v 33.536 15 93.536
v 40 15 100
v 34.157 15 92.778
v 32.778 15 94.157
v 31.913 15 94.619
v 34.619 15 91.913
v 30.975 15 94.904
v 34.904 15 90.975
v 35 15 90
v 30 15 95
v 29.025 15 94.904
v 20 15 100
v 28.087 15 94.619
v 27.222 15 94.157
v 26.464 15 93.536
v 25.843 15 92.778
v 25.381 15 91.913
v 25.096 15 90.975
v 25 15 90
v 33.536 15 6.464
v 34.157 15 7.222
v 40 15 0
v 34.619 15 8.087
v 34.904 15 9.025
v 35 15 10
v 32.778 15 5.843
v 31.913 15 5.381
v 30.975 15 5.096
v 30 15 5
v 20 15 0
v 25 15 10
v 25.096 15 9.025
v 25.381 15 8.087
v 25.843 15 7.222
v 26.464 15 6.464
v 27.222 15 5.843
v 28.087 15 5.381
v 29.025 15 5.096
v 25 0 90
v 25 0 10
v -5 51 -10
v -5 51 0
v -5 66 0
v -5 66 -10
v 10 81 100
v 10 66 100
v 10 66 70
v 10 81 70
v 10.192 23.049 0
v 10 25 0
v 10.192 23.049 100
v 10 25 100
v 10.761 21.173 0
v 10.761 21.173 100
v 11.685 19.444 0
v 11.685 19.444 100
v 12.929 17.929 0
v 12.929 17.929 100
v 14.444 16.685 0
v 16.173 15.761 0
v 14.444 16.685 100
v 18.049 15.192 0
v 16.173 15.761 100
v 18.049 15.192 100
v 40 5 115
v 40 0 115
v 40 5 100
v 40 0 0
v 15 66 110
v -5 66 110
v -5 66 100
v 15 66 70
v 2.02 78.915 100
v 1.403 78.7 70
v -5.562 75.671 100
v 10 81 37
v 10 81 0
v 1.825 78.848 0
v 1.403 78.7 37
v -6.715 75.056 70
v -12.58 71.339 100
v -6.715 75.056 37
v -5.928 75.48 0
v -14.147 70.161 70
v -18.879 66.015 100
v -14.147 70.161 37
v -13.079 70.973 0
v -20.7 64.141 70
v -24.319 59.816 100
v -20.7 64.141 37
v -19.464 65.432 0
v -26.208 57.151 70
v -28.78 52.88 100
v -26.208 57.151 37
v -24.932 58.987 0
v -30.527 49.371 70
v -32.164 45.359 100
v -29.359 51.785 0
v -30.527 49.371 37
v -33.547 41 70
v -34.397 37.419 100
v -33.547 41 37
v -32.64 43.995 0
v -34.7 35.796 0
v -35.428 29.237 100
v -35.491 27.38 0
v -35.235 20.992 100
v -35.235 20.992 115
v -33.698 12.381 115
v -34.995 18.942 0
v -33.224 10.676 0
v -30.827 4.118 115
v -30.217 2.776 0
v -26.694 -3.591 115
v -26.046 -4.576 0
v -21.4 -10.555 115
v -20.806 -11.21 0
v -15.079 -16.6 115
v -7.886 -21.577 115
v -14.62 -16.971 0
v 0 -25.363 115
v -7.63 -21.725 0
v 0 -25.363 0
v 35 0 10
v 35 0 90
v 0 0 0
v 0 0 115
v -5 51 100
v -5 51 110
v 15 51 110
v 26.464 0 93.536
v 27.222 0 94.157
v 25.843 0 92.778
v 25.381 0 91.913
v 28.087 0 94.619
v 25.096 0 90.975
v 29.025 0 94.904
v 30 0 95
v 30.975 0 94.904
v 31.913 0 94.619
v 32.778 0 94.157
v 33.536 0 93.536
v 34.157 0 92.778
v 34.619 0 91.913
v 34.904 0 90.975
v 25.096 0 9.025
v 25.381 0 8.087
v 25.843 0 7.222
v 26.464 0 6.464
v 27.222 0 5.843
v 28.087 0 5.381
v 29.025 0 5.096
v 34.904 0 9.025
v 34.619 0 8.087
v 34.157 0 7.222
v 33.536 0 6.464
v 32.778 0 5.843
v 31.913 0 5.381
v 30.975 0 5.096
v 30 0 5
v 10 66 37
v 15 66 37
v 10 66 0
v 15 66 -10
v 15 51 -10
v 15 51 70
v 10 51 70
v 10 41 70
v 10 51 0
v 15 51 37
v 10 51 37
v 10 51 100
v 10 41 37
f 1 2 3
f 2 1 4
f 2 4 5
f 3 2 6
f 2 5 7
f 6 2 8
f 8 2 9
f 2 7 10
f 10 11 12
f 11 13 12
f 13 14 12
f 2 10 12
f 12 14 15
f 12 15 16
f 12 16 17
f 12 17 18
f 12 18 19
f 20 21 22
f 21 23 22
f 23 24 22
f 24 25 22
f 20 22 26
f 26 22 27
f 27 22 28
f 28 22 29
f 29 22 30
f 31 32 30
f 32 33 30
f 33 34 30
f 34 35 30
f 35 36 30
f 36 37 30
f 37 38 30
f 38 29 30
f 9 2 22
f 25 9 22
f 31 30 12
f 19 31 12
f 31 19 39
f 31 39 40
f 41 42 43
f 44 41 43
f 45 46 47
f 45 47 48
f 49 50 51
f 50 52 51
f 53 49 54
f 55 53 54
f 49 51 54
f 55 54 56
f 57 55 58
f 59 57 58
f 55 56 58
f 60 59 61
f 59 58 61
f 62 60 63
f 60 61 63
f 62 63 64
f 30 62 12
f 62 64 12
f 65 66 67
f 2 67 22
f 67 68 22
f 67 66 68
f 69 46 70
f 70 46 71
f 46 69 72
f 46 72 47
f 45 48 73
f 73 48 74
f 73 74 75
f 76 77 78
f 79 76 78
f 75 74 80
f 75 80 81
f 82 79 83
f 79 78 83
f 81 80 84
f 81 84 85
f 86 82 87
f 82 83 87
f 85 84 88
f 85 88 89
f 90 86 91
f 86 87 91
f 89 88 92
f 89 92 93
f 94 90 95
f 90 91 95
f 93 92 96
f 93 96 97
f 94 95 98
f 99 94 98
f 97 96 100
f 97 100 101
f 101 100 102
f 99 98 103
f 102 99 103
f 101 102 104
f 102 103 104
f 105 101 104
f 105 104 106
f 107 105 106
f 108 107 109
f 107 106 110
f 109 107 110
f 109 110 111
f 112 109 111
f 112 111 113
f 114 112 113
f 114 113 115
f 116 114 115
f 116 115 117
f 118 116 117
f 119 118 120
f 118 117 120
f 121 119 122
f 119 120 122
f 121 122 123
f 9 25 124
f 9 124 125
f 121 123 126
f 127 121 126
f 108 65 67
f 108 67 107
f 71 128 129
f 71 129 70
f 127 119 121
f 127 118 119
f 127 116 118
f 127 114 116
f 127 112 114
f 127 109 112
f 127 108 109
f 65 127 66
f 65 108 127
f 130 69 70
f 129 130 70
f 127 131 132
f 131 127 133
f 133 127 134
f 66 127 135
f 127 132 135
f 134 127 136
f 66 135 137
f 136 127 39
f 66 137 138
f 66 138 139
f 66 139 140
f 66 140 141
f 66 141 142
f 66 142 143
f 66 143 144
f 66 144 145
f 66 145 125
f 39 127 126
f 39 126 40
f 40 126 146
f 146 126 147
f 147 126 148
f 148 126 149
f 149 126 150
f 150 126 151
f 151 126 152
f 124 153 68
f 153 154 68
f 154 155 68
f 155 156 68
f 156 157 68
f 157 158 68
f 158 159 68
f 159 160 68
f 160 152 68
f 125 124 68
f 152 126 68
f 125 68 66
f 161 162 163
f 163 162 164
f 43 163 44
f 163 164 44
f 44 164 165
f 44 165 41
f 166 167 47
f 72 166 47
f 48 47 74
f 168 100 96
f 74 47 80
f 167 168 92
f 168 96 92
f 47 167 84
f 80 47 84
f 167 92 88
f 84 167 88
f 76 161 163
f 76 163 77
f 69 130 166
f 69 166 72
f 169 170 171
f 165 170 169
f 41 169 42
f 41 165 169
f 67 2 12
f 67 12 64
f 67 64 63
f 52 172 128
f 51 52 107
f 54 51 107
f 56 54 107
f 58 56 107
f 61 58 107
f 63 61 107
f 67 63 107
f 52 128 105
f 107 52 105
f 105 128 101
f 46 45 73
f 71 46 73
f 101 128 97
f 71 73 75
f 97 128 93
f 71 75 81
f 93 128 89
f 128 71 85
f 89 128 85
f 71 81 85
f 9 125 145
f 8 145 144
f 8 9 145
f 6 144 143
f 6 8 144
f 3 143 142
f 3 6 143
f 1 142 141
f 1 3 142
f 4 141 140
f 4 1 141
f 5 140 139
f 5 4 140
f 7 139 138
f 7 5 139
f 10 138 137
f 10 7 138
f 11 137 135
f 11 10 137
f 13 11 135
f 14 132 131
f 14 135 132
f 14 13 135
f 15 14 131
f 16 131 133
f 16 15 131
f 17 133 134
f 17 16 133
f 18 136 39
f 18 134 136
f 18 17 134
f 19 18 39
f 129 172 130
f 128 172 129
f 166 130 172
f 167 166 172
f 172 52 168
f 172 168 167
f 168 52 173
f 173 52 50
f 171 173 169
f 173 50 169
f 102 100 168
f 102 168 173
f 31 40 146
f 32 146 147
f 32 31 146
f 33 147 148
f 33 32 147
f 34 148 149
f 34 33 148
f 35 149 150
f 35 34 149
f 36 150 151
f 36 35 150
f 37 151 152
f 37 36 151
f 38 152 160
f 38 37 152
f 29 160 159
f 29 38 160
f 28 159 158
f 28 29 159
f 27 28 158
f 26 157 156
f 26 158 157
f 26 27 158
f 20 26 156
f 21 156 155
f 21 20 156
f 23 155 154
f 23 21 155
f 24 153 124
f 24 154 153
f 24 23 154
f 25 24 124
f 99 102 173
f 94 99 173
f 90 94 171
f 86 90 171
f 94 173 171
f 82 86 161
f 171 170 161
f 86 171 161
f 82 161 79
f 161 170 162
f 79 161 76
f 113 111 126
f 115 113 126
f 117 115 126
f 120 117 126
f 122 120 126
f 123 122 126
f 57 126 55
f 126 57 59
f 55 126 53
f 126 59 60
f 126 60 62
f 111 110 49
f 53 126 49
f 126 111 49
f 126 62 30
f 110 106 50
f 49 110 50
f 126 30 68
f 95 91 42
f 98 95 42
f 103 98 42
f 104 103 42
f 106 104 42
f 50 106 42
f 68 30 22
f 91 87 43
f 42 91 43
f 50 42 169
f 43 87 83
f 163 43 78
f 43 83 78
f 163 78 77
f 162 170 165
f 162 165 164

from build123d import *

# Parameters (mm, degrees)
BOSS_EXTRUDE1_DEPTH      = 115
CUT_EXTRUDE1_DEPTH       = 1
CUT_EXTRUDE1_DEPTH_BACK  = 15
SKETCH3_W                = 20
SKETCH3_H                = 15
BOSS_EXTRUDE2_DEPTH      = 10
BOSS_EXTRUDE2_DEPTH_BACK = 110
SKETCH4_W                = 33
SKETCH4_H                = 40
CUT_EXTRUDE2_DEPTH       = 31
CUT_EXTRUDE2_DEPTH_BACK  = 46.5
CUT_EXTRUDE4_DEPTH       = 67
CUT_EXTRUDE4_DEPTH_BACK  = 41.362796982
FILLET1_R                = 10


with BuildPart() as part:
    # Sketch1 → Boss-Extrude1 (new body)
    with BuildSketch(Plane.XY):
        with BuildLine():
            Line((0, 0), (40, 0))
            Line((40, 0), (40, 15))
            Line((40, 15), (10, 15))
            Line((10, 15), (10, 81))
            ThreePointArc((10, 81), (-35.256322222, 31.603413808), (0, -25.362796982))
            Line((0, -25.362796982), (0, 0))
        make_face()
    extrude(amount=BOSS_EXTRUDE1_DEPTH)

    # Sketch2 → Cut-Extrude1 (cut, two sides)
    with BuildSketch(Plane.XY.offset(115)) as cut_extrude1_sk:
        with BuildLine():
            Line((40, 5), (-35.235044142, 20.9917023))
            ThreePointArc((-35.235044142, 20.9917023), (-24.318751046, 59.816391467), (10, 81))
            Line((10, 81), (10, 15))
            Line((10, 15), (40, 15))
            Line((40, 15), (40, 5))
        make_face()
    extrude(amount=CUT_EXTRUDE1_DEPTH, mode=Mode.SUBTRACT)
    extrude(cut_extrude1_sk.sketch, amount=-CUT_EXTRUDE1_DEPTH_BACK, mode=Mode.SUBTRACT)

    # Sketch3 → Boss-Extrude2 (add, two sides)
    with BuildSketch(Plane(origin=(0, 0, 0), x_dir=(-1, 0, 0), z_dir=(0, 0, -1))) as boss_extrude2_sk:
        with Locations((-5, 58.5)):
            Rectangle(SKETCH3_W, SKETCH3_H)
    extrude(amount=BOSS_EXTRUDE2_DEPTH)
    extrude(boss_extrude2_sk.sketch, amount=-BOSS_EXTRUDE2_DEPTH_BACK)

    # Sketch4 → Cut-Extrude2 (cut, two sides)
    with BuildSketch(Plane(origin=(10, 0, 0), x_dir=(0, 0, -1), z_dir=(1, 0, 0))) as cut_extrude2_sk:
        with Locations((-53.5, 61)):
            Rectangle(SKETCH4_W, SKETCH4_H)
    extrude(amount=CUT_EXTRUDE2_DEPTH, mode=Mode.SUBTRACT)
    extrude(cut_extrude2_sk.sketch, amount=-CUT_EXTRUDE2_DEPTH_BACK, mode=Mode.SUBTRACT)

    # Sketch6 → Cut-Extrude4 (cut, two sides)
    with BuildSketch(Plane(origin=(0, 15, 0), x_dir=(1, 0, 0), z_dir=(0, 1, 0))) as cut_extrude4_sk:
        with BuildLine():
            Line((35, -10), (35, -90))
            ThreePointArc((35, -90), (30, -95), (25, -90))
            Line((25, -90), (25, -10))
            ThreePointArc((25, -10), (30, -5), (35, -10))
        make_face()
    extrude(amount=CUT_EXTRUDE4_DEPTH, mode=Mode.SUBTRACT)
    extrude(cut_extrude4_sk.sketch, amount=-CUT_EXTRUDE4_DEPTH_BACK, mode=Mode.SUBTRACT)

    # Fillet1
    fillet1_edges = [part.edges().sort_by_distance(p)[0] for p in [
        (10, 15, 50),
    ]]
    fillet(fillet1_edges, radius=FILLET1_R)


solid = part.part
